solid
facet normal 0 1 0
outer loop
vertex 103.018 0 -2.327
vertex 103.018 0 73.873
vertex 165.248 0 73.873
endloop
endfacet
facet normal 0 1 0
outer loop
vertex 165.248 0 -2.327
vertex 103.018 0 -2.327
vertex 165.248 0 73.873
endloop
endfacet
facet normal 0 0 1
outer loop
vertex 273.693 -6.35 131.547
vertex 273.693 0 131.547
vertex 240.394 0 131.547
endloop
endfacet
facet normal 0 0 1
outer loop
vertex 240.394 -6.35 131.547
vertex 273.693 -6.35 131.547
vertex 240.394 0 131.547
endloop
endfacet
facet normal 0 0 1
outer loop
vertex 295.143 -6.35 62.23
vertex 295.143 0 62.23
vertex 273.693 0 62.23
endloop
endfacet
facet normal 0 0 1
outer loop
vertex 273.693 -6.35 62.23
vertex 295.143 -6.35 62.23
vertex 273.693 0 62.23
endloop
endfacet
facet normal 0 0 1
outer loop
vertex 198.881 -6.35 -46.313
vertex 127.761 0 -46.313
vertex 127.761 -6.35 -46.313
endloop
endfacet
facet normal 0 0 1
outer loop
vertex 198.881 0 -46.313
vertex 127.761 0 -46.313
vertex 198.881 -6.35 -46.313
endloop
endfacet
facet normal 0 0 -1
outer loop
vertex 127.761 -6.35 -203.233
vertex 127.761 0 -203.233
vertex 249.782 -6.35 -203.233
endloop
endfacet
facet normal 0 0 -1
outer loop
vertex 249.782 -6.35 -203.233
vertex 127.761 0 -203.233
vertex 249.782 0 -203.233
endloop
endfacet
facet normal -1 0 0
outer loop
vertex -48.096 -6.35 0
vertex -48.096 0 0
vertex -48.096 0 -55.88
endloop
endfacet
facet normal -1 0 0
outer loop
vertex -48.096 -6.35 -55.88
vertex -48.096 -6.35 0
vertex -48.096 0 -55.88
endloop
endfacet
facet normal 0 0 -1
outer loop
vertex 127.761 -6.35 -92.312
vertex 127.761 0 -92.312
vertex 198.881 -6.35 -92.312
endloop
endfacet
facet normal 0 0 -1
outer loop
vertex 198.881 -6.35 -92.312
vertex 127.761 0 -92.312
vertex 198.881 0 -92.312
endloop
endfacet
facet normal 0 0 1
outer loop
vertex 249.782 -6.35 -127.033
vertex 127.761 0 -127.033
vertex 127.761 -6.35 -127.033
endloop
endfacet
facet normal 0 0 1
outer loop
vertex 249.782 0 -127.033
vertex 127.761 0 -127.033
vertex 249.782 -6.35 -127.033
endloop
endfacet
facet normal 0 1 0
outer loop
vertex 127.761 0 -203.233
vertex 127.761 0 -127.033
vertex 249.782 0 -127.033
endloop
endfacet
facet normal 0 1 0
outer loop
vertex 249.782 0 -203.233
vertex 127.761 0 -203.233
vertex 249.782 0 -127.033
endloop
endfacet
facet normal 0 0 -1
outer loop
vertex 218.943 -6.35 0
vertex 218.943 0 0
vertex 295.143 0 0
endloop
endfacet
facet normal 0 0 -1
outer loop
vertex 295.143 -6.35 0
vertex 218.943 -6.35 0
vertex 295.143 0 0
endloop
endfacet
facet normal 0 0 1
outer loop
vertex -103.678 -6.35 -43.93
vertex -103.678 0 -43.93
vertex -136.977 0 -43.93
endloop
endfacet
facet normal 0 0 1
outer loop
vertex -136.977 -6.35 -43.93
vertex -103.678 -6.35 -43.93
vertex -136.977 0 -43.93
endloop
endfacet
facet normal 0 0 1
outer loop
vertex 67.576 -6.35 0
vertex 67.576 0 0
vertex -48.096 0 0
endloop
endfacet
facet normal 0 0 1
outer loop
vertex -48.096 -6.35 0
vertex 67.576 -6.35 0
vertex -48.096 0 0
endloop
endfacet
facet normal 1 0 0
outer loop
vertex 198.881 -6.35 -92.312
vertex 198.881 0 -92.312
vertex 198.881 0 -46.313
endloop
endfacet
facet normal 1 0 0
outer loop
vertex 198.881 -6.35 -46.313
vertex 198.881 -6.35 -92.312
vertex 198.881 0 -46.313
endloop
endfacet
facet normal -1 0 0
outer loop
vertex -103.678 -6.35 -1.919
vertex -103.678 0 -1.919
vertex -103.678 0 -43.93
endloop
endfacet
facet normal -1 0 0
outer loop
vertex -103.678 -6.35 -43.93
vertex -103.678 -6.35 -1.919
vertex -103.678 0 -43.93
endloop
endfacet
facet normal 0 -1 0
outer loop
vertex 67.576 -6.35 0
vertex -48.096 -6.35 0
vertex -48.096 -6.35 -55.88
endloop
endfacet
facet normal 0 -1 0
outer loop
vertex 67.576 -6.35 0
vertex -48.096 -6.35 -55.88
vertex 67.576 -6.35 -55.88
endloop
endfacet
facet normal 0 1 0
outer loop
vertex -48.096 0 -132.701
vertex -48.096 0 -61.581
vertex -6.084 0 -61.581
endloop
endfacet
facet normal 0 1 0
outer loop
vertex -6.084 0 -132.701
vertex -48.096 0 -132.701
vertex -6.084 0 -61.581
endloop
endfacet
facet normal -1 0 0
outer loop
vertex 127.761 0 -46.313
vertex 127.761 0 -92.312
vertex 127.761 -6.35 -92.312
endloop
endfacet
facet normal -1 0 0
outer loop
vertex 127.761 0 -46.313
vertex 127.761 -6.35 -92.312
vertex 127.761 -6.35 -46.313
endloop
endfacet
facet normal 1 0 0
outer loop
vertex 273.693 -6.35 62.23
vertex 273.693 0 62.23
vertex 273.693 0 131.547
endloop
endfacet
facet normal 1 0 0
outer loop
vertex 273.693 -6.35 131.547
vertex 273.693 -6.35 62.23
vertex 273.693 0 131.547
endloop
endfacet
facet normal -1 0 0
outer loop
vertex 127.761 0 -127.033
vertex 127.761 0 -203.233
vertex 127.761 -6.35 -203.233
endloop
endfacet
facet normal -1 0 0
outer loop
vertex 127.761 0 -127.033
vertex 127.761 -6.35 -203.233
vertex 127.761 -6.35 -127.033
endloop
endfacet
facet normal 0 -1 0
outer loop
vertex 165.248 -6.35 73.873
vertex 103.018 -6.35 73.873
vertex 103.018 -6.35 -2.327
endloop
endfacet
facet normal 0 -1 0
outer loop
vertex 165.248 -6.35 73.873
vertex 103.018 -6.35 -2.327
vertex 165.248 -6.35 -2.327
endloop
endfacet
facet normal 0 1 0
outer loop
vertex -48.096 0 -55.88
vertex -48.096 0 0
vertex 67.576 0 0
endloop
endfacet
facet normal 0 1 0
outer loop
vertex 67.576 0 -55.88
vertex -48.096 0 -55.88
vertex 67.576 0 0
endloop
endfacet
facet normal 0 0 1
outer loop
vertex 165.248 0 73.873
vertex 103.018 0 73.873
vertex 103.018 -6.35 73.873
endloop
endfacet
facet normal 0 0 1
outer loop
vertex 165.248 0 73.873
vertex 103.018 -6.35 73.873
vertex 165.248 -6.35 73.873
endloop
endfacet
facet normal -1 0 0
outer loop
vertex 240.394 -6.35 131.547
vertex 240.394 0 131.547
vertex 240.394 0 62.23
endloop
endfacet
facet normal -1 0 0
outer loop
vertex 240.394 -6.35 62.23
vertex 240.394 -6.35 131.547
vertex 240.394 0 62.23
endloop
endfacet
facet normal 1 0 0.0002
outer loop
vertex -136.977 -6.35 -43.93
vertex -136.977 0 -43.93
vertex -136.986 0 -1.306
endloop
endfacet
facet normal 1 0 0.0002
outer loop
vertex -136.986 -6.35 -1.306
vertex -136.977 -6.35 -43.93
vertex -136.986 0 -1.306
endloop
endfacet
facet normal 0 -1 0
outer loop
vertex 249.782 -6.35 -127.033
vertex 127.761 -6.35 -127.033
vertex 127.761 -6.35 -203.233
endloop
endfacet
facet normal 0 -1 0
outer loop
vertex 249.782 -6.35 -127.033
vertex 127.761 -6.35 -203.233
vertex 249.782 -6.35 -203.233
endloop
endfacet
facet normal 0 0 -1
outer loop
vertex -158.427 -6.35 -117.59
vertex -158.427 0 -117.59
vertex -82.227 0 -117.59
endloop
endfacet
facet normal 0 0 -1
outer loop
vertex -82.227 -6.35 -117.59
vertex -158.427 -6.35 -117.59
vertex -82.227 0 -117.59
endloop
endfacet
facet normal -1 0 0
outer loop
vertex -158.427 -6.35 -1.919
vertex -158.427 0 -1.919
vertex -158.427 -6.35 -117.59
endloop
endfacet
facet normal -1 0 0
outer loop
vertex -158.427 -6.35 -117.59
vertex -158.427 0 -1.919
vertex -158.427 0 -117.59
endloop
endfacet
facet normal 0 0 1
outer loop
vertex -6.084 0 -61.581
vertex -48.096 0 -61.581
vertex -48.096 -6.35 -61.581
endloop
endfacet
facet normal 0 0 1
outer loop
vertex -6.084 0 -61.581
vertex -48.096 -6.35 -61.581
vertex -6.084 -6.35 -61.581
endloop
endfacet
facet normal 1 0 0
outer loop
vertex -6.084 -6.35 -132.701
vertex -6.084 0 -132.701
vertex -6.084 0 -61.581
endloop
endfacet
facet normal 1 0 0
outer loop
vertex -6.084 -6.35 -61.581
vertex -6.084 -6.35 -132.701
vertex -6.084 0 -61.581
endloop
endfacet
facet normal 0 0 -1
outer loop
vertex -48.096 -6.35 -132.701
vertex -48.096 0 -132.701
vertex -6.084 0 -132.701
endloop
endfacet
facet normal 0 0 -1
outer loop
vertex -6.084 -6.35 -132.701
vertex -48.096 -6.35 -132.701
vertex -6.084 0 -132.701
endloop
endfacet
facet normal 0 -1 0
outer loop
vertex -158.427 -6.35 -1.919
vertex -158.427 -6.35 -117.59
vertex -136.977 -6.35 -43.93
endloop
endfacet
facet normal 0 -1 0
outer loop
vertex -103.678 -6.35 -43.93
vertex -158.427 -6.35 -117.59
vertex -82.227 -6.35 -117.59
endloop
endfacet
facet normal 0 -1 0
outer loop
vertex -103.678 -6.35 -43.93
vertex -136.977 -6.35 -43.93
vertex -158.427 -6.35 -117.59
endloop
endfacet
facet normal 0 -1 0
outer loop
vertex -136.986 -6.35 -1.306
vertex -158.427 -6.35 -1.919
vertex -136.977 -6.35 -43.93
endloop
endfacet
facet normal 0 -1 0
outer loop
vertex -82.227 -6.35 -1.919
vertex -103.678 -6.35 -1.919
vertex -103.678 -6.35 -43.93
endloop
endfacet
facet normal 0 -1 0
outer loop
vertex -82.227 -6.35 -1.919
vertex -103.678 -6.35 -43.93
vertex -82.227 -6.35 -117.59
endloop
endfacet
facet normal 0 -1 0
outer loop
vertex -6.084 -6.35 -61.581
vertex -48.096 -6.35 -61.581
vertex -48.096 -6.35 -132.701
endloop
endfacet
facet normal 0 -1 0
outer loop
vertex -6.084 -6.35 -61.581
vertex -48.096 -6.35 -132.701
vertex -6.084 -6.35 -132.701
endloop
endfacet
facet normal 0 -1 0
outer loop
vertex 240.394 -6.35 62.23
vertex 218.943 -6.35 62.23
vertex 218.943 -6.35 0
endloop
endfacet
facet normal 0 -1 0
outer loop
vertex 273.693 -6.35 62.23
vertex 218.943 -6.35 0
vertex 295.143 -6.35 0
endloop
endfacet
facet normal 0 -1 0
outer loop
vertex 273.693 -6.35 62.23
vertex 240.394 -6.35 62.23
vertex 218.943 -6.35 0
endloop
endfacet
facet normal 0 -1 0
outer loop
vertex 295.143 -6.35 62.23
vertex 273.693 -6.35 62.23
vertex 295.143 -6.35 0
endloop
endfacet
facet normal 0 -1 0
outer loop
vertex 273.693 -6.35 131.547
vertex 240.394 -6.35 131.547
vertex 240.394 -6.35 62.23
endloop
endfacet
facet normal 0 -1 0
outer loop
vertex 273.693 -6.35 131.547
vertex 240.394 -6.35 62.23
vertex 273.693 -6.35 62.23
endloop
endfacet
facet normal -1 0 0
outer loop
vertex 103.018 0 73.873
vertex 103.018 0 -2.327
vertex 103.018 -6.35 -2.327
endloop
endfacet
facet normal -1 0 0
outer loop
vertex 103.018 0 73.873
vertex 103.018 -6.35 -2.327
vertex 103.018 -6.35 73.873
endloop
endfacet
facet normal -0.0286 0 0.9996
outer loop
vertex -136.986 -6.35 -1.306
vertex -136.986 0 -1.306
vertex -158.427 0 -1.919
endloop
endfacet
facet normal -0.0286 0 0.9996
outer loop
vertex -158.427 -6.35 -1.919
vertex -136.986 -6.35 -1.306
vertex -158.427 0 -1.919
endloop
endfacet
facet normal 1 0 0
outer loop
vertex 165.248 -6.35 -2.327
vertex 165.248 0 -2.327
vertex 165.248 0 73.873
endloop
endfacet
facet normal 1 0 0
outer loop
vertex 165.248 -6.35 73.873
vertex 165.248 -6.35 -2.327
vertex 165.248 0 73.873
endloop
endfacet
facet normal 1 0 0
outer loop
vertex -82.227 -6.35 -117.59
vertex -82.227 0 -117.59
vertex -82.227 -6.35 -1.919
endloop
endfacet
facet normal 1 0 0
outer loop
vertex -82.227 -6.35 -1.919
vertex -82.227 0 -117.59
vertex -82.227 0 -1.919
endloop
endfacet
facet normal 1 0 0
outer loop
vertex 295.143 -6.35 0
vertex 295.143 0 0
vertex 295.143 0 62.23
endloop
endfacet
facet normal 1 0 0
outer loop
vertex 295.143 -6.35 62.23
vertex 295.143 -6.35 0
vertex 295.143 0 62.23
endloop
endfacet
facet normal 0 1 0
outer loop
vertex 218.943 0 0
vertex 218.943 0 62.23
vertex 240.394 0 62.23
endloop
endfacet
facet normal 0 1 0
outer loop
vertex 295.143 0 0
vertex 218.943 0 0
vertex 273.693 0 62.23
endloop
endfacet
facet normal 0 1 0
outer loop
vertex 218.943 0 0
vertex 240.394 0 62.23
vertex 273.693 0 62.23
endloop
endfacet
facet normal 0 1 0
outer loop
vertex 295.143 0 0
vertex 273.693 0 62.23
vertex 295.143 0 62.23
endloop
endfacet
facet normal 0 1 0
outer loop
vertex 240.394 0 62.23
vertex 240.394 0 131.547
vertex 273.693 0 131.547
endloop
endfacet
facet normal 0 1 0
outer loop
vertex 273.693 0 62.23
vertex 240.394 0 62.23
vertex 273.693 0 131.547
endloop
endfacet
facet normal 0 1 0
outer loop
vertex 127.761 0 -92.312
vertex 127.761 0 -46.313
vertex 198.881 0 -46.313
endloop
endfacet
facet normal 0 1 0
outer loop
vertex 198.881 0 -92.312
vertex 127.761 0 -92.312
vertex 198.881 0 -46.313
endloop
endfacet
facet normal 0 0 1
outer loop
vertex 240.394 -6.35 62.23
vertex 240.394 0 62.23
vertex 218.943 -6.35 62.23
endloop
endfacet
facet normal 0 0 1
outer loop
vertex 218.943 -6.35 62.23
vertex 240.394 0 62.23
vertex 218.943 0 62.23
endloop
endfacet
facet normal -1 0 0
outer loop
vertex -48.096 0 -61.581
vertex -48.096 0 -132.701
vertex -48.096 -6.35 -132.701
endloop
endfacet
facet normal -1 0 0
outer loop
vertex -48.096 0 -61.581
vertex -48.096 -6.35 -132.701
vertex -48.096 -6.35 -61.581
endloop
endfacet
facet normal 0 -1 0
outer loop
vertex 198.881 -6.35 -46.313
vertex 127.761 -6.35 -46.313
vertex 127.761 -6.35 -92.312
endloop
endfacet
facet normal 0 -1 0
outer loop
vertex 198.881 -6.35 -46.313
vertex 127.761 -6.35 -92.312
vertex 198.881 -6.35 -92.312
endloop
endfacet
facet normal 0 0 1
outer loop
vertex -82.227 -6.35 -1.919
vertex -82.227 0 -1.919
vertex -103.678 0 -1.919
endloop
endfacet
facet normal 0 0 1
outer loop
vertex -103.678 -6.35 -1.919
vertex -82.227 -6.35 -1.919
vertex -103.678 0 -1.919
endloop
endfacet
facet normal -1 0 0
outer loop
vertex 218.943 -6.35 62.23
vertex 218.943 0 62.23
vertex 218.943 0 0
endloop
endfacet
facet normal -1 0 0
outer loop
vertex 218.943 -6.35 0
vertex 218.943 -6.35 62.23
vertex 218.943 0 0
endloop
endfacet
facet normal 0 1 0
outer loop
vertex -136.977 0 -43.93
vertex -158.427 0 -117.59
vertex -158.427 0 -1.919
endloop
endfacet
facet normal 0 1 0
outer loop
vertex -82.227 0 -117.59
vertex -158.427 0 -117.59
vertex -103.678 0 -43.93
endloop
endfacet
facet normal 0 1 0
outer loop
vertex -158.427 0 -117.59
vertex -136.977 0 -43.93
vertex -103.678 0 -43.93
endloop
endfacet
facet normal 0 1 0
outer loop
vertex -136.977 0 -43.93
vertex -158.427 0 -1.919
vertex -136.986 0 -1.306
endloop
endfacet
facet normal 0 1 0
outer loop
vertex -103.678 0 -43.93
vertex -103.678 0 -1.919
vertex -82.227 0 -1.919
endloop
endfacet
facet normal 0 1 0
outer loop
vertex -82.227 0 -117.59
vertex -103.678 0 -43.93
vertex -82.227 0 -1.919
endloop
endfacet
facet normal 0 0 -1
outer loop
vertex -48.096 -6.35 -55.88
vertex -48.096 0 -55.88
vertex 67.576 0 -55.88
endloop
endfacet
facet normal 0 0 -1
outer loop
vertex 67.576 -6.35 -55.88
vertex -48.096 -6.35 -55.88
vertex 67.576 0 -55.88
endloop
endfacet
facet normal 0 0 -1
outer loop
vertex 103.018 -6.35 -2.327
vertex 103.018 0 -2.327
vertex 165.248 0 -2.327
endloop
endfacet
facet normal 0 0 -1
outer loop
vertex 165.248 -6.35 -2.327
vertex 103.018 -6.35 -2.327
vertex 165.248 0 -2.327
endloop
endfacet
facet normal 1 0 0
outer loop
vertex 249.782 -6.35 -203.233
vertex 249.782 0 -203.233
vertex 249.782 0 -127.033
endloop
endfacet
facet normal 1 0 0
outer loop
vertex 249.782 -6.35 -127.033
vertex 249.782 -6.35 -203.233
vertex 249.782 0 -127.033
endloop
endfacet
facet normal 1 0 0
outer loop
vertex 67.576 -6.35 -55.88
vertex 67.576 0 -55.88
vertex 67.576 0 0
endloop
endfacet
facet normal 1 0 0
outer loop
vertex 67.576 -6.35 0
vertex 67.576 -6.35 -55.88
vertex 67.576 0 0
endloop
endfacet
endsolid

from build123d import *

# Parameters (mm, degrees)
F0_W     = 42.0116
F0_H     = 71.12
F0_W_2   = 62.23
F0_H_2   = 76.2
F0_W_3   = 71.12
F0_H_3   = 45.9994
F0_W_4   = 122.0216
F1_DEPTH = 6.35


with BuildPart() as f1:
    # F0 (on Front) → F1 (new body)
    with BuildSketch(Plane.XZ):
        Polygon((-136.985763, -1.306279), (-158.427313, -1.918894), (-158.427313, -117.590494), (-82.227313, -117.590494), (-82.227313, -1.918894), (-103.677613, -1.918894), (-103.677613, -43.930494), (-136.977013, -43.930494), align=None)
        with Locations((-27.090078, -97.141198)):
            Rectangle(F0_W, F0_H)
        Polygon((67.575722, -55.88), (67.575722, 0), (-48.095878, 0), (-48.095878, -55.88), (-6.084278, -55.88), align=None)
        with Locations((134.132725, 35.773376)):
            Rectangle(F0_W_2, F0_H_2)
        Polygon((240.393687, 62.23), (218.943387, 62.23), (218.943387, 0), (295.143387, 0), (295.143387, 62.23), (273.693087, 62.23), (273.693087, 131.5466), (240.393687, 131.5466), align=None)
        with Locations((163.320515, -69.312368)):
            Rectangle(F0_W_3, F0_H_3)
        with Locations((188.771315, -165.132944)):
            Rectangle(F0_W_4, F0_H_2)
    extrude(amount=F1_DEPTH)


solid = f1.part
